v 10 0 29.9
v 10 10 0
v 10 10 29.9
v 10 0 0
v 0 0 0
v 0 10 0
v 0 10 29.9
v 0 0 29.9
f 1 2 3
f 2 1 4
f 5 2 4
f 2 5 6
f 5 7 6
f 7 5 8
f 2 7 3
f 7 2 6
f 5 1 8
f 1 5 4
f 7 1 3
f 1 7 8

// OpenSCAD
/* ---------------------------------------------------------------------------
   3MF multi-color workflow test -- three 10 mm cubes stacked in Z, each
   overlapping the one below by eps, one color each. Small enough to check
   an export in the slicer in seconds before trying it on a real part.

   Lazy union is an export setting, not something this file can switch on.
   Each color only survives as its own object if it is a direct top-level
   statement (if/for blocks are fine); anything drawn inside a module that
   is called without its own color() collapses into one object.

   Workflows to try:
     1. Script (Orca-ready, filaments pre-assigned, parts stay stacked):
          uv run scad_to_3mf.py 3mf_test.scad
     2. GUI 3MF: Preferences > Features > lazy-union on, F6, File > Export >
        Export as 3MF. Orca drops each object to the bed unless combined on
        import, and then filaments must be set per part by hand.
     3. CLI 3MF, same result as 2:
          openscad --enable=lazy-union -o 3mf_test.3mf 3mf_test.scad
     4. Three STLs: export once per `part` value below ("blue", "red",
        "yellow"), select all three in one Orca import and answer yes to
        loading them as a single object with multiple parts. STL
        coordinates are absolute, so the parts stay stacked.

   REV 1.0: initial.
   --------------------------------------------------------------------------- */

/* [Test] */
s   = 10;   // cube edge, mm
eps = 0.05; // overlap between neighbouring cubes, mm

/* [Render Select] */
part = "all"; // what to render  ["all","blue","red","yellow"]

// ---------------------------------------------------------------------------

if (part == "all" || part == "blue")
    color("blue") cube(s);
if (part == "all" || part == "red")
    translate([0, 0, s - eps]) color("red") cube(s);
if (part == "all" || part == "yellow")
    translate([0, 0, 2 * (s - eps)]) color("yellow") cube(s);
